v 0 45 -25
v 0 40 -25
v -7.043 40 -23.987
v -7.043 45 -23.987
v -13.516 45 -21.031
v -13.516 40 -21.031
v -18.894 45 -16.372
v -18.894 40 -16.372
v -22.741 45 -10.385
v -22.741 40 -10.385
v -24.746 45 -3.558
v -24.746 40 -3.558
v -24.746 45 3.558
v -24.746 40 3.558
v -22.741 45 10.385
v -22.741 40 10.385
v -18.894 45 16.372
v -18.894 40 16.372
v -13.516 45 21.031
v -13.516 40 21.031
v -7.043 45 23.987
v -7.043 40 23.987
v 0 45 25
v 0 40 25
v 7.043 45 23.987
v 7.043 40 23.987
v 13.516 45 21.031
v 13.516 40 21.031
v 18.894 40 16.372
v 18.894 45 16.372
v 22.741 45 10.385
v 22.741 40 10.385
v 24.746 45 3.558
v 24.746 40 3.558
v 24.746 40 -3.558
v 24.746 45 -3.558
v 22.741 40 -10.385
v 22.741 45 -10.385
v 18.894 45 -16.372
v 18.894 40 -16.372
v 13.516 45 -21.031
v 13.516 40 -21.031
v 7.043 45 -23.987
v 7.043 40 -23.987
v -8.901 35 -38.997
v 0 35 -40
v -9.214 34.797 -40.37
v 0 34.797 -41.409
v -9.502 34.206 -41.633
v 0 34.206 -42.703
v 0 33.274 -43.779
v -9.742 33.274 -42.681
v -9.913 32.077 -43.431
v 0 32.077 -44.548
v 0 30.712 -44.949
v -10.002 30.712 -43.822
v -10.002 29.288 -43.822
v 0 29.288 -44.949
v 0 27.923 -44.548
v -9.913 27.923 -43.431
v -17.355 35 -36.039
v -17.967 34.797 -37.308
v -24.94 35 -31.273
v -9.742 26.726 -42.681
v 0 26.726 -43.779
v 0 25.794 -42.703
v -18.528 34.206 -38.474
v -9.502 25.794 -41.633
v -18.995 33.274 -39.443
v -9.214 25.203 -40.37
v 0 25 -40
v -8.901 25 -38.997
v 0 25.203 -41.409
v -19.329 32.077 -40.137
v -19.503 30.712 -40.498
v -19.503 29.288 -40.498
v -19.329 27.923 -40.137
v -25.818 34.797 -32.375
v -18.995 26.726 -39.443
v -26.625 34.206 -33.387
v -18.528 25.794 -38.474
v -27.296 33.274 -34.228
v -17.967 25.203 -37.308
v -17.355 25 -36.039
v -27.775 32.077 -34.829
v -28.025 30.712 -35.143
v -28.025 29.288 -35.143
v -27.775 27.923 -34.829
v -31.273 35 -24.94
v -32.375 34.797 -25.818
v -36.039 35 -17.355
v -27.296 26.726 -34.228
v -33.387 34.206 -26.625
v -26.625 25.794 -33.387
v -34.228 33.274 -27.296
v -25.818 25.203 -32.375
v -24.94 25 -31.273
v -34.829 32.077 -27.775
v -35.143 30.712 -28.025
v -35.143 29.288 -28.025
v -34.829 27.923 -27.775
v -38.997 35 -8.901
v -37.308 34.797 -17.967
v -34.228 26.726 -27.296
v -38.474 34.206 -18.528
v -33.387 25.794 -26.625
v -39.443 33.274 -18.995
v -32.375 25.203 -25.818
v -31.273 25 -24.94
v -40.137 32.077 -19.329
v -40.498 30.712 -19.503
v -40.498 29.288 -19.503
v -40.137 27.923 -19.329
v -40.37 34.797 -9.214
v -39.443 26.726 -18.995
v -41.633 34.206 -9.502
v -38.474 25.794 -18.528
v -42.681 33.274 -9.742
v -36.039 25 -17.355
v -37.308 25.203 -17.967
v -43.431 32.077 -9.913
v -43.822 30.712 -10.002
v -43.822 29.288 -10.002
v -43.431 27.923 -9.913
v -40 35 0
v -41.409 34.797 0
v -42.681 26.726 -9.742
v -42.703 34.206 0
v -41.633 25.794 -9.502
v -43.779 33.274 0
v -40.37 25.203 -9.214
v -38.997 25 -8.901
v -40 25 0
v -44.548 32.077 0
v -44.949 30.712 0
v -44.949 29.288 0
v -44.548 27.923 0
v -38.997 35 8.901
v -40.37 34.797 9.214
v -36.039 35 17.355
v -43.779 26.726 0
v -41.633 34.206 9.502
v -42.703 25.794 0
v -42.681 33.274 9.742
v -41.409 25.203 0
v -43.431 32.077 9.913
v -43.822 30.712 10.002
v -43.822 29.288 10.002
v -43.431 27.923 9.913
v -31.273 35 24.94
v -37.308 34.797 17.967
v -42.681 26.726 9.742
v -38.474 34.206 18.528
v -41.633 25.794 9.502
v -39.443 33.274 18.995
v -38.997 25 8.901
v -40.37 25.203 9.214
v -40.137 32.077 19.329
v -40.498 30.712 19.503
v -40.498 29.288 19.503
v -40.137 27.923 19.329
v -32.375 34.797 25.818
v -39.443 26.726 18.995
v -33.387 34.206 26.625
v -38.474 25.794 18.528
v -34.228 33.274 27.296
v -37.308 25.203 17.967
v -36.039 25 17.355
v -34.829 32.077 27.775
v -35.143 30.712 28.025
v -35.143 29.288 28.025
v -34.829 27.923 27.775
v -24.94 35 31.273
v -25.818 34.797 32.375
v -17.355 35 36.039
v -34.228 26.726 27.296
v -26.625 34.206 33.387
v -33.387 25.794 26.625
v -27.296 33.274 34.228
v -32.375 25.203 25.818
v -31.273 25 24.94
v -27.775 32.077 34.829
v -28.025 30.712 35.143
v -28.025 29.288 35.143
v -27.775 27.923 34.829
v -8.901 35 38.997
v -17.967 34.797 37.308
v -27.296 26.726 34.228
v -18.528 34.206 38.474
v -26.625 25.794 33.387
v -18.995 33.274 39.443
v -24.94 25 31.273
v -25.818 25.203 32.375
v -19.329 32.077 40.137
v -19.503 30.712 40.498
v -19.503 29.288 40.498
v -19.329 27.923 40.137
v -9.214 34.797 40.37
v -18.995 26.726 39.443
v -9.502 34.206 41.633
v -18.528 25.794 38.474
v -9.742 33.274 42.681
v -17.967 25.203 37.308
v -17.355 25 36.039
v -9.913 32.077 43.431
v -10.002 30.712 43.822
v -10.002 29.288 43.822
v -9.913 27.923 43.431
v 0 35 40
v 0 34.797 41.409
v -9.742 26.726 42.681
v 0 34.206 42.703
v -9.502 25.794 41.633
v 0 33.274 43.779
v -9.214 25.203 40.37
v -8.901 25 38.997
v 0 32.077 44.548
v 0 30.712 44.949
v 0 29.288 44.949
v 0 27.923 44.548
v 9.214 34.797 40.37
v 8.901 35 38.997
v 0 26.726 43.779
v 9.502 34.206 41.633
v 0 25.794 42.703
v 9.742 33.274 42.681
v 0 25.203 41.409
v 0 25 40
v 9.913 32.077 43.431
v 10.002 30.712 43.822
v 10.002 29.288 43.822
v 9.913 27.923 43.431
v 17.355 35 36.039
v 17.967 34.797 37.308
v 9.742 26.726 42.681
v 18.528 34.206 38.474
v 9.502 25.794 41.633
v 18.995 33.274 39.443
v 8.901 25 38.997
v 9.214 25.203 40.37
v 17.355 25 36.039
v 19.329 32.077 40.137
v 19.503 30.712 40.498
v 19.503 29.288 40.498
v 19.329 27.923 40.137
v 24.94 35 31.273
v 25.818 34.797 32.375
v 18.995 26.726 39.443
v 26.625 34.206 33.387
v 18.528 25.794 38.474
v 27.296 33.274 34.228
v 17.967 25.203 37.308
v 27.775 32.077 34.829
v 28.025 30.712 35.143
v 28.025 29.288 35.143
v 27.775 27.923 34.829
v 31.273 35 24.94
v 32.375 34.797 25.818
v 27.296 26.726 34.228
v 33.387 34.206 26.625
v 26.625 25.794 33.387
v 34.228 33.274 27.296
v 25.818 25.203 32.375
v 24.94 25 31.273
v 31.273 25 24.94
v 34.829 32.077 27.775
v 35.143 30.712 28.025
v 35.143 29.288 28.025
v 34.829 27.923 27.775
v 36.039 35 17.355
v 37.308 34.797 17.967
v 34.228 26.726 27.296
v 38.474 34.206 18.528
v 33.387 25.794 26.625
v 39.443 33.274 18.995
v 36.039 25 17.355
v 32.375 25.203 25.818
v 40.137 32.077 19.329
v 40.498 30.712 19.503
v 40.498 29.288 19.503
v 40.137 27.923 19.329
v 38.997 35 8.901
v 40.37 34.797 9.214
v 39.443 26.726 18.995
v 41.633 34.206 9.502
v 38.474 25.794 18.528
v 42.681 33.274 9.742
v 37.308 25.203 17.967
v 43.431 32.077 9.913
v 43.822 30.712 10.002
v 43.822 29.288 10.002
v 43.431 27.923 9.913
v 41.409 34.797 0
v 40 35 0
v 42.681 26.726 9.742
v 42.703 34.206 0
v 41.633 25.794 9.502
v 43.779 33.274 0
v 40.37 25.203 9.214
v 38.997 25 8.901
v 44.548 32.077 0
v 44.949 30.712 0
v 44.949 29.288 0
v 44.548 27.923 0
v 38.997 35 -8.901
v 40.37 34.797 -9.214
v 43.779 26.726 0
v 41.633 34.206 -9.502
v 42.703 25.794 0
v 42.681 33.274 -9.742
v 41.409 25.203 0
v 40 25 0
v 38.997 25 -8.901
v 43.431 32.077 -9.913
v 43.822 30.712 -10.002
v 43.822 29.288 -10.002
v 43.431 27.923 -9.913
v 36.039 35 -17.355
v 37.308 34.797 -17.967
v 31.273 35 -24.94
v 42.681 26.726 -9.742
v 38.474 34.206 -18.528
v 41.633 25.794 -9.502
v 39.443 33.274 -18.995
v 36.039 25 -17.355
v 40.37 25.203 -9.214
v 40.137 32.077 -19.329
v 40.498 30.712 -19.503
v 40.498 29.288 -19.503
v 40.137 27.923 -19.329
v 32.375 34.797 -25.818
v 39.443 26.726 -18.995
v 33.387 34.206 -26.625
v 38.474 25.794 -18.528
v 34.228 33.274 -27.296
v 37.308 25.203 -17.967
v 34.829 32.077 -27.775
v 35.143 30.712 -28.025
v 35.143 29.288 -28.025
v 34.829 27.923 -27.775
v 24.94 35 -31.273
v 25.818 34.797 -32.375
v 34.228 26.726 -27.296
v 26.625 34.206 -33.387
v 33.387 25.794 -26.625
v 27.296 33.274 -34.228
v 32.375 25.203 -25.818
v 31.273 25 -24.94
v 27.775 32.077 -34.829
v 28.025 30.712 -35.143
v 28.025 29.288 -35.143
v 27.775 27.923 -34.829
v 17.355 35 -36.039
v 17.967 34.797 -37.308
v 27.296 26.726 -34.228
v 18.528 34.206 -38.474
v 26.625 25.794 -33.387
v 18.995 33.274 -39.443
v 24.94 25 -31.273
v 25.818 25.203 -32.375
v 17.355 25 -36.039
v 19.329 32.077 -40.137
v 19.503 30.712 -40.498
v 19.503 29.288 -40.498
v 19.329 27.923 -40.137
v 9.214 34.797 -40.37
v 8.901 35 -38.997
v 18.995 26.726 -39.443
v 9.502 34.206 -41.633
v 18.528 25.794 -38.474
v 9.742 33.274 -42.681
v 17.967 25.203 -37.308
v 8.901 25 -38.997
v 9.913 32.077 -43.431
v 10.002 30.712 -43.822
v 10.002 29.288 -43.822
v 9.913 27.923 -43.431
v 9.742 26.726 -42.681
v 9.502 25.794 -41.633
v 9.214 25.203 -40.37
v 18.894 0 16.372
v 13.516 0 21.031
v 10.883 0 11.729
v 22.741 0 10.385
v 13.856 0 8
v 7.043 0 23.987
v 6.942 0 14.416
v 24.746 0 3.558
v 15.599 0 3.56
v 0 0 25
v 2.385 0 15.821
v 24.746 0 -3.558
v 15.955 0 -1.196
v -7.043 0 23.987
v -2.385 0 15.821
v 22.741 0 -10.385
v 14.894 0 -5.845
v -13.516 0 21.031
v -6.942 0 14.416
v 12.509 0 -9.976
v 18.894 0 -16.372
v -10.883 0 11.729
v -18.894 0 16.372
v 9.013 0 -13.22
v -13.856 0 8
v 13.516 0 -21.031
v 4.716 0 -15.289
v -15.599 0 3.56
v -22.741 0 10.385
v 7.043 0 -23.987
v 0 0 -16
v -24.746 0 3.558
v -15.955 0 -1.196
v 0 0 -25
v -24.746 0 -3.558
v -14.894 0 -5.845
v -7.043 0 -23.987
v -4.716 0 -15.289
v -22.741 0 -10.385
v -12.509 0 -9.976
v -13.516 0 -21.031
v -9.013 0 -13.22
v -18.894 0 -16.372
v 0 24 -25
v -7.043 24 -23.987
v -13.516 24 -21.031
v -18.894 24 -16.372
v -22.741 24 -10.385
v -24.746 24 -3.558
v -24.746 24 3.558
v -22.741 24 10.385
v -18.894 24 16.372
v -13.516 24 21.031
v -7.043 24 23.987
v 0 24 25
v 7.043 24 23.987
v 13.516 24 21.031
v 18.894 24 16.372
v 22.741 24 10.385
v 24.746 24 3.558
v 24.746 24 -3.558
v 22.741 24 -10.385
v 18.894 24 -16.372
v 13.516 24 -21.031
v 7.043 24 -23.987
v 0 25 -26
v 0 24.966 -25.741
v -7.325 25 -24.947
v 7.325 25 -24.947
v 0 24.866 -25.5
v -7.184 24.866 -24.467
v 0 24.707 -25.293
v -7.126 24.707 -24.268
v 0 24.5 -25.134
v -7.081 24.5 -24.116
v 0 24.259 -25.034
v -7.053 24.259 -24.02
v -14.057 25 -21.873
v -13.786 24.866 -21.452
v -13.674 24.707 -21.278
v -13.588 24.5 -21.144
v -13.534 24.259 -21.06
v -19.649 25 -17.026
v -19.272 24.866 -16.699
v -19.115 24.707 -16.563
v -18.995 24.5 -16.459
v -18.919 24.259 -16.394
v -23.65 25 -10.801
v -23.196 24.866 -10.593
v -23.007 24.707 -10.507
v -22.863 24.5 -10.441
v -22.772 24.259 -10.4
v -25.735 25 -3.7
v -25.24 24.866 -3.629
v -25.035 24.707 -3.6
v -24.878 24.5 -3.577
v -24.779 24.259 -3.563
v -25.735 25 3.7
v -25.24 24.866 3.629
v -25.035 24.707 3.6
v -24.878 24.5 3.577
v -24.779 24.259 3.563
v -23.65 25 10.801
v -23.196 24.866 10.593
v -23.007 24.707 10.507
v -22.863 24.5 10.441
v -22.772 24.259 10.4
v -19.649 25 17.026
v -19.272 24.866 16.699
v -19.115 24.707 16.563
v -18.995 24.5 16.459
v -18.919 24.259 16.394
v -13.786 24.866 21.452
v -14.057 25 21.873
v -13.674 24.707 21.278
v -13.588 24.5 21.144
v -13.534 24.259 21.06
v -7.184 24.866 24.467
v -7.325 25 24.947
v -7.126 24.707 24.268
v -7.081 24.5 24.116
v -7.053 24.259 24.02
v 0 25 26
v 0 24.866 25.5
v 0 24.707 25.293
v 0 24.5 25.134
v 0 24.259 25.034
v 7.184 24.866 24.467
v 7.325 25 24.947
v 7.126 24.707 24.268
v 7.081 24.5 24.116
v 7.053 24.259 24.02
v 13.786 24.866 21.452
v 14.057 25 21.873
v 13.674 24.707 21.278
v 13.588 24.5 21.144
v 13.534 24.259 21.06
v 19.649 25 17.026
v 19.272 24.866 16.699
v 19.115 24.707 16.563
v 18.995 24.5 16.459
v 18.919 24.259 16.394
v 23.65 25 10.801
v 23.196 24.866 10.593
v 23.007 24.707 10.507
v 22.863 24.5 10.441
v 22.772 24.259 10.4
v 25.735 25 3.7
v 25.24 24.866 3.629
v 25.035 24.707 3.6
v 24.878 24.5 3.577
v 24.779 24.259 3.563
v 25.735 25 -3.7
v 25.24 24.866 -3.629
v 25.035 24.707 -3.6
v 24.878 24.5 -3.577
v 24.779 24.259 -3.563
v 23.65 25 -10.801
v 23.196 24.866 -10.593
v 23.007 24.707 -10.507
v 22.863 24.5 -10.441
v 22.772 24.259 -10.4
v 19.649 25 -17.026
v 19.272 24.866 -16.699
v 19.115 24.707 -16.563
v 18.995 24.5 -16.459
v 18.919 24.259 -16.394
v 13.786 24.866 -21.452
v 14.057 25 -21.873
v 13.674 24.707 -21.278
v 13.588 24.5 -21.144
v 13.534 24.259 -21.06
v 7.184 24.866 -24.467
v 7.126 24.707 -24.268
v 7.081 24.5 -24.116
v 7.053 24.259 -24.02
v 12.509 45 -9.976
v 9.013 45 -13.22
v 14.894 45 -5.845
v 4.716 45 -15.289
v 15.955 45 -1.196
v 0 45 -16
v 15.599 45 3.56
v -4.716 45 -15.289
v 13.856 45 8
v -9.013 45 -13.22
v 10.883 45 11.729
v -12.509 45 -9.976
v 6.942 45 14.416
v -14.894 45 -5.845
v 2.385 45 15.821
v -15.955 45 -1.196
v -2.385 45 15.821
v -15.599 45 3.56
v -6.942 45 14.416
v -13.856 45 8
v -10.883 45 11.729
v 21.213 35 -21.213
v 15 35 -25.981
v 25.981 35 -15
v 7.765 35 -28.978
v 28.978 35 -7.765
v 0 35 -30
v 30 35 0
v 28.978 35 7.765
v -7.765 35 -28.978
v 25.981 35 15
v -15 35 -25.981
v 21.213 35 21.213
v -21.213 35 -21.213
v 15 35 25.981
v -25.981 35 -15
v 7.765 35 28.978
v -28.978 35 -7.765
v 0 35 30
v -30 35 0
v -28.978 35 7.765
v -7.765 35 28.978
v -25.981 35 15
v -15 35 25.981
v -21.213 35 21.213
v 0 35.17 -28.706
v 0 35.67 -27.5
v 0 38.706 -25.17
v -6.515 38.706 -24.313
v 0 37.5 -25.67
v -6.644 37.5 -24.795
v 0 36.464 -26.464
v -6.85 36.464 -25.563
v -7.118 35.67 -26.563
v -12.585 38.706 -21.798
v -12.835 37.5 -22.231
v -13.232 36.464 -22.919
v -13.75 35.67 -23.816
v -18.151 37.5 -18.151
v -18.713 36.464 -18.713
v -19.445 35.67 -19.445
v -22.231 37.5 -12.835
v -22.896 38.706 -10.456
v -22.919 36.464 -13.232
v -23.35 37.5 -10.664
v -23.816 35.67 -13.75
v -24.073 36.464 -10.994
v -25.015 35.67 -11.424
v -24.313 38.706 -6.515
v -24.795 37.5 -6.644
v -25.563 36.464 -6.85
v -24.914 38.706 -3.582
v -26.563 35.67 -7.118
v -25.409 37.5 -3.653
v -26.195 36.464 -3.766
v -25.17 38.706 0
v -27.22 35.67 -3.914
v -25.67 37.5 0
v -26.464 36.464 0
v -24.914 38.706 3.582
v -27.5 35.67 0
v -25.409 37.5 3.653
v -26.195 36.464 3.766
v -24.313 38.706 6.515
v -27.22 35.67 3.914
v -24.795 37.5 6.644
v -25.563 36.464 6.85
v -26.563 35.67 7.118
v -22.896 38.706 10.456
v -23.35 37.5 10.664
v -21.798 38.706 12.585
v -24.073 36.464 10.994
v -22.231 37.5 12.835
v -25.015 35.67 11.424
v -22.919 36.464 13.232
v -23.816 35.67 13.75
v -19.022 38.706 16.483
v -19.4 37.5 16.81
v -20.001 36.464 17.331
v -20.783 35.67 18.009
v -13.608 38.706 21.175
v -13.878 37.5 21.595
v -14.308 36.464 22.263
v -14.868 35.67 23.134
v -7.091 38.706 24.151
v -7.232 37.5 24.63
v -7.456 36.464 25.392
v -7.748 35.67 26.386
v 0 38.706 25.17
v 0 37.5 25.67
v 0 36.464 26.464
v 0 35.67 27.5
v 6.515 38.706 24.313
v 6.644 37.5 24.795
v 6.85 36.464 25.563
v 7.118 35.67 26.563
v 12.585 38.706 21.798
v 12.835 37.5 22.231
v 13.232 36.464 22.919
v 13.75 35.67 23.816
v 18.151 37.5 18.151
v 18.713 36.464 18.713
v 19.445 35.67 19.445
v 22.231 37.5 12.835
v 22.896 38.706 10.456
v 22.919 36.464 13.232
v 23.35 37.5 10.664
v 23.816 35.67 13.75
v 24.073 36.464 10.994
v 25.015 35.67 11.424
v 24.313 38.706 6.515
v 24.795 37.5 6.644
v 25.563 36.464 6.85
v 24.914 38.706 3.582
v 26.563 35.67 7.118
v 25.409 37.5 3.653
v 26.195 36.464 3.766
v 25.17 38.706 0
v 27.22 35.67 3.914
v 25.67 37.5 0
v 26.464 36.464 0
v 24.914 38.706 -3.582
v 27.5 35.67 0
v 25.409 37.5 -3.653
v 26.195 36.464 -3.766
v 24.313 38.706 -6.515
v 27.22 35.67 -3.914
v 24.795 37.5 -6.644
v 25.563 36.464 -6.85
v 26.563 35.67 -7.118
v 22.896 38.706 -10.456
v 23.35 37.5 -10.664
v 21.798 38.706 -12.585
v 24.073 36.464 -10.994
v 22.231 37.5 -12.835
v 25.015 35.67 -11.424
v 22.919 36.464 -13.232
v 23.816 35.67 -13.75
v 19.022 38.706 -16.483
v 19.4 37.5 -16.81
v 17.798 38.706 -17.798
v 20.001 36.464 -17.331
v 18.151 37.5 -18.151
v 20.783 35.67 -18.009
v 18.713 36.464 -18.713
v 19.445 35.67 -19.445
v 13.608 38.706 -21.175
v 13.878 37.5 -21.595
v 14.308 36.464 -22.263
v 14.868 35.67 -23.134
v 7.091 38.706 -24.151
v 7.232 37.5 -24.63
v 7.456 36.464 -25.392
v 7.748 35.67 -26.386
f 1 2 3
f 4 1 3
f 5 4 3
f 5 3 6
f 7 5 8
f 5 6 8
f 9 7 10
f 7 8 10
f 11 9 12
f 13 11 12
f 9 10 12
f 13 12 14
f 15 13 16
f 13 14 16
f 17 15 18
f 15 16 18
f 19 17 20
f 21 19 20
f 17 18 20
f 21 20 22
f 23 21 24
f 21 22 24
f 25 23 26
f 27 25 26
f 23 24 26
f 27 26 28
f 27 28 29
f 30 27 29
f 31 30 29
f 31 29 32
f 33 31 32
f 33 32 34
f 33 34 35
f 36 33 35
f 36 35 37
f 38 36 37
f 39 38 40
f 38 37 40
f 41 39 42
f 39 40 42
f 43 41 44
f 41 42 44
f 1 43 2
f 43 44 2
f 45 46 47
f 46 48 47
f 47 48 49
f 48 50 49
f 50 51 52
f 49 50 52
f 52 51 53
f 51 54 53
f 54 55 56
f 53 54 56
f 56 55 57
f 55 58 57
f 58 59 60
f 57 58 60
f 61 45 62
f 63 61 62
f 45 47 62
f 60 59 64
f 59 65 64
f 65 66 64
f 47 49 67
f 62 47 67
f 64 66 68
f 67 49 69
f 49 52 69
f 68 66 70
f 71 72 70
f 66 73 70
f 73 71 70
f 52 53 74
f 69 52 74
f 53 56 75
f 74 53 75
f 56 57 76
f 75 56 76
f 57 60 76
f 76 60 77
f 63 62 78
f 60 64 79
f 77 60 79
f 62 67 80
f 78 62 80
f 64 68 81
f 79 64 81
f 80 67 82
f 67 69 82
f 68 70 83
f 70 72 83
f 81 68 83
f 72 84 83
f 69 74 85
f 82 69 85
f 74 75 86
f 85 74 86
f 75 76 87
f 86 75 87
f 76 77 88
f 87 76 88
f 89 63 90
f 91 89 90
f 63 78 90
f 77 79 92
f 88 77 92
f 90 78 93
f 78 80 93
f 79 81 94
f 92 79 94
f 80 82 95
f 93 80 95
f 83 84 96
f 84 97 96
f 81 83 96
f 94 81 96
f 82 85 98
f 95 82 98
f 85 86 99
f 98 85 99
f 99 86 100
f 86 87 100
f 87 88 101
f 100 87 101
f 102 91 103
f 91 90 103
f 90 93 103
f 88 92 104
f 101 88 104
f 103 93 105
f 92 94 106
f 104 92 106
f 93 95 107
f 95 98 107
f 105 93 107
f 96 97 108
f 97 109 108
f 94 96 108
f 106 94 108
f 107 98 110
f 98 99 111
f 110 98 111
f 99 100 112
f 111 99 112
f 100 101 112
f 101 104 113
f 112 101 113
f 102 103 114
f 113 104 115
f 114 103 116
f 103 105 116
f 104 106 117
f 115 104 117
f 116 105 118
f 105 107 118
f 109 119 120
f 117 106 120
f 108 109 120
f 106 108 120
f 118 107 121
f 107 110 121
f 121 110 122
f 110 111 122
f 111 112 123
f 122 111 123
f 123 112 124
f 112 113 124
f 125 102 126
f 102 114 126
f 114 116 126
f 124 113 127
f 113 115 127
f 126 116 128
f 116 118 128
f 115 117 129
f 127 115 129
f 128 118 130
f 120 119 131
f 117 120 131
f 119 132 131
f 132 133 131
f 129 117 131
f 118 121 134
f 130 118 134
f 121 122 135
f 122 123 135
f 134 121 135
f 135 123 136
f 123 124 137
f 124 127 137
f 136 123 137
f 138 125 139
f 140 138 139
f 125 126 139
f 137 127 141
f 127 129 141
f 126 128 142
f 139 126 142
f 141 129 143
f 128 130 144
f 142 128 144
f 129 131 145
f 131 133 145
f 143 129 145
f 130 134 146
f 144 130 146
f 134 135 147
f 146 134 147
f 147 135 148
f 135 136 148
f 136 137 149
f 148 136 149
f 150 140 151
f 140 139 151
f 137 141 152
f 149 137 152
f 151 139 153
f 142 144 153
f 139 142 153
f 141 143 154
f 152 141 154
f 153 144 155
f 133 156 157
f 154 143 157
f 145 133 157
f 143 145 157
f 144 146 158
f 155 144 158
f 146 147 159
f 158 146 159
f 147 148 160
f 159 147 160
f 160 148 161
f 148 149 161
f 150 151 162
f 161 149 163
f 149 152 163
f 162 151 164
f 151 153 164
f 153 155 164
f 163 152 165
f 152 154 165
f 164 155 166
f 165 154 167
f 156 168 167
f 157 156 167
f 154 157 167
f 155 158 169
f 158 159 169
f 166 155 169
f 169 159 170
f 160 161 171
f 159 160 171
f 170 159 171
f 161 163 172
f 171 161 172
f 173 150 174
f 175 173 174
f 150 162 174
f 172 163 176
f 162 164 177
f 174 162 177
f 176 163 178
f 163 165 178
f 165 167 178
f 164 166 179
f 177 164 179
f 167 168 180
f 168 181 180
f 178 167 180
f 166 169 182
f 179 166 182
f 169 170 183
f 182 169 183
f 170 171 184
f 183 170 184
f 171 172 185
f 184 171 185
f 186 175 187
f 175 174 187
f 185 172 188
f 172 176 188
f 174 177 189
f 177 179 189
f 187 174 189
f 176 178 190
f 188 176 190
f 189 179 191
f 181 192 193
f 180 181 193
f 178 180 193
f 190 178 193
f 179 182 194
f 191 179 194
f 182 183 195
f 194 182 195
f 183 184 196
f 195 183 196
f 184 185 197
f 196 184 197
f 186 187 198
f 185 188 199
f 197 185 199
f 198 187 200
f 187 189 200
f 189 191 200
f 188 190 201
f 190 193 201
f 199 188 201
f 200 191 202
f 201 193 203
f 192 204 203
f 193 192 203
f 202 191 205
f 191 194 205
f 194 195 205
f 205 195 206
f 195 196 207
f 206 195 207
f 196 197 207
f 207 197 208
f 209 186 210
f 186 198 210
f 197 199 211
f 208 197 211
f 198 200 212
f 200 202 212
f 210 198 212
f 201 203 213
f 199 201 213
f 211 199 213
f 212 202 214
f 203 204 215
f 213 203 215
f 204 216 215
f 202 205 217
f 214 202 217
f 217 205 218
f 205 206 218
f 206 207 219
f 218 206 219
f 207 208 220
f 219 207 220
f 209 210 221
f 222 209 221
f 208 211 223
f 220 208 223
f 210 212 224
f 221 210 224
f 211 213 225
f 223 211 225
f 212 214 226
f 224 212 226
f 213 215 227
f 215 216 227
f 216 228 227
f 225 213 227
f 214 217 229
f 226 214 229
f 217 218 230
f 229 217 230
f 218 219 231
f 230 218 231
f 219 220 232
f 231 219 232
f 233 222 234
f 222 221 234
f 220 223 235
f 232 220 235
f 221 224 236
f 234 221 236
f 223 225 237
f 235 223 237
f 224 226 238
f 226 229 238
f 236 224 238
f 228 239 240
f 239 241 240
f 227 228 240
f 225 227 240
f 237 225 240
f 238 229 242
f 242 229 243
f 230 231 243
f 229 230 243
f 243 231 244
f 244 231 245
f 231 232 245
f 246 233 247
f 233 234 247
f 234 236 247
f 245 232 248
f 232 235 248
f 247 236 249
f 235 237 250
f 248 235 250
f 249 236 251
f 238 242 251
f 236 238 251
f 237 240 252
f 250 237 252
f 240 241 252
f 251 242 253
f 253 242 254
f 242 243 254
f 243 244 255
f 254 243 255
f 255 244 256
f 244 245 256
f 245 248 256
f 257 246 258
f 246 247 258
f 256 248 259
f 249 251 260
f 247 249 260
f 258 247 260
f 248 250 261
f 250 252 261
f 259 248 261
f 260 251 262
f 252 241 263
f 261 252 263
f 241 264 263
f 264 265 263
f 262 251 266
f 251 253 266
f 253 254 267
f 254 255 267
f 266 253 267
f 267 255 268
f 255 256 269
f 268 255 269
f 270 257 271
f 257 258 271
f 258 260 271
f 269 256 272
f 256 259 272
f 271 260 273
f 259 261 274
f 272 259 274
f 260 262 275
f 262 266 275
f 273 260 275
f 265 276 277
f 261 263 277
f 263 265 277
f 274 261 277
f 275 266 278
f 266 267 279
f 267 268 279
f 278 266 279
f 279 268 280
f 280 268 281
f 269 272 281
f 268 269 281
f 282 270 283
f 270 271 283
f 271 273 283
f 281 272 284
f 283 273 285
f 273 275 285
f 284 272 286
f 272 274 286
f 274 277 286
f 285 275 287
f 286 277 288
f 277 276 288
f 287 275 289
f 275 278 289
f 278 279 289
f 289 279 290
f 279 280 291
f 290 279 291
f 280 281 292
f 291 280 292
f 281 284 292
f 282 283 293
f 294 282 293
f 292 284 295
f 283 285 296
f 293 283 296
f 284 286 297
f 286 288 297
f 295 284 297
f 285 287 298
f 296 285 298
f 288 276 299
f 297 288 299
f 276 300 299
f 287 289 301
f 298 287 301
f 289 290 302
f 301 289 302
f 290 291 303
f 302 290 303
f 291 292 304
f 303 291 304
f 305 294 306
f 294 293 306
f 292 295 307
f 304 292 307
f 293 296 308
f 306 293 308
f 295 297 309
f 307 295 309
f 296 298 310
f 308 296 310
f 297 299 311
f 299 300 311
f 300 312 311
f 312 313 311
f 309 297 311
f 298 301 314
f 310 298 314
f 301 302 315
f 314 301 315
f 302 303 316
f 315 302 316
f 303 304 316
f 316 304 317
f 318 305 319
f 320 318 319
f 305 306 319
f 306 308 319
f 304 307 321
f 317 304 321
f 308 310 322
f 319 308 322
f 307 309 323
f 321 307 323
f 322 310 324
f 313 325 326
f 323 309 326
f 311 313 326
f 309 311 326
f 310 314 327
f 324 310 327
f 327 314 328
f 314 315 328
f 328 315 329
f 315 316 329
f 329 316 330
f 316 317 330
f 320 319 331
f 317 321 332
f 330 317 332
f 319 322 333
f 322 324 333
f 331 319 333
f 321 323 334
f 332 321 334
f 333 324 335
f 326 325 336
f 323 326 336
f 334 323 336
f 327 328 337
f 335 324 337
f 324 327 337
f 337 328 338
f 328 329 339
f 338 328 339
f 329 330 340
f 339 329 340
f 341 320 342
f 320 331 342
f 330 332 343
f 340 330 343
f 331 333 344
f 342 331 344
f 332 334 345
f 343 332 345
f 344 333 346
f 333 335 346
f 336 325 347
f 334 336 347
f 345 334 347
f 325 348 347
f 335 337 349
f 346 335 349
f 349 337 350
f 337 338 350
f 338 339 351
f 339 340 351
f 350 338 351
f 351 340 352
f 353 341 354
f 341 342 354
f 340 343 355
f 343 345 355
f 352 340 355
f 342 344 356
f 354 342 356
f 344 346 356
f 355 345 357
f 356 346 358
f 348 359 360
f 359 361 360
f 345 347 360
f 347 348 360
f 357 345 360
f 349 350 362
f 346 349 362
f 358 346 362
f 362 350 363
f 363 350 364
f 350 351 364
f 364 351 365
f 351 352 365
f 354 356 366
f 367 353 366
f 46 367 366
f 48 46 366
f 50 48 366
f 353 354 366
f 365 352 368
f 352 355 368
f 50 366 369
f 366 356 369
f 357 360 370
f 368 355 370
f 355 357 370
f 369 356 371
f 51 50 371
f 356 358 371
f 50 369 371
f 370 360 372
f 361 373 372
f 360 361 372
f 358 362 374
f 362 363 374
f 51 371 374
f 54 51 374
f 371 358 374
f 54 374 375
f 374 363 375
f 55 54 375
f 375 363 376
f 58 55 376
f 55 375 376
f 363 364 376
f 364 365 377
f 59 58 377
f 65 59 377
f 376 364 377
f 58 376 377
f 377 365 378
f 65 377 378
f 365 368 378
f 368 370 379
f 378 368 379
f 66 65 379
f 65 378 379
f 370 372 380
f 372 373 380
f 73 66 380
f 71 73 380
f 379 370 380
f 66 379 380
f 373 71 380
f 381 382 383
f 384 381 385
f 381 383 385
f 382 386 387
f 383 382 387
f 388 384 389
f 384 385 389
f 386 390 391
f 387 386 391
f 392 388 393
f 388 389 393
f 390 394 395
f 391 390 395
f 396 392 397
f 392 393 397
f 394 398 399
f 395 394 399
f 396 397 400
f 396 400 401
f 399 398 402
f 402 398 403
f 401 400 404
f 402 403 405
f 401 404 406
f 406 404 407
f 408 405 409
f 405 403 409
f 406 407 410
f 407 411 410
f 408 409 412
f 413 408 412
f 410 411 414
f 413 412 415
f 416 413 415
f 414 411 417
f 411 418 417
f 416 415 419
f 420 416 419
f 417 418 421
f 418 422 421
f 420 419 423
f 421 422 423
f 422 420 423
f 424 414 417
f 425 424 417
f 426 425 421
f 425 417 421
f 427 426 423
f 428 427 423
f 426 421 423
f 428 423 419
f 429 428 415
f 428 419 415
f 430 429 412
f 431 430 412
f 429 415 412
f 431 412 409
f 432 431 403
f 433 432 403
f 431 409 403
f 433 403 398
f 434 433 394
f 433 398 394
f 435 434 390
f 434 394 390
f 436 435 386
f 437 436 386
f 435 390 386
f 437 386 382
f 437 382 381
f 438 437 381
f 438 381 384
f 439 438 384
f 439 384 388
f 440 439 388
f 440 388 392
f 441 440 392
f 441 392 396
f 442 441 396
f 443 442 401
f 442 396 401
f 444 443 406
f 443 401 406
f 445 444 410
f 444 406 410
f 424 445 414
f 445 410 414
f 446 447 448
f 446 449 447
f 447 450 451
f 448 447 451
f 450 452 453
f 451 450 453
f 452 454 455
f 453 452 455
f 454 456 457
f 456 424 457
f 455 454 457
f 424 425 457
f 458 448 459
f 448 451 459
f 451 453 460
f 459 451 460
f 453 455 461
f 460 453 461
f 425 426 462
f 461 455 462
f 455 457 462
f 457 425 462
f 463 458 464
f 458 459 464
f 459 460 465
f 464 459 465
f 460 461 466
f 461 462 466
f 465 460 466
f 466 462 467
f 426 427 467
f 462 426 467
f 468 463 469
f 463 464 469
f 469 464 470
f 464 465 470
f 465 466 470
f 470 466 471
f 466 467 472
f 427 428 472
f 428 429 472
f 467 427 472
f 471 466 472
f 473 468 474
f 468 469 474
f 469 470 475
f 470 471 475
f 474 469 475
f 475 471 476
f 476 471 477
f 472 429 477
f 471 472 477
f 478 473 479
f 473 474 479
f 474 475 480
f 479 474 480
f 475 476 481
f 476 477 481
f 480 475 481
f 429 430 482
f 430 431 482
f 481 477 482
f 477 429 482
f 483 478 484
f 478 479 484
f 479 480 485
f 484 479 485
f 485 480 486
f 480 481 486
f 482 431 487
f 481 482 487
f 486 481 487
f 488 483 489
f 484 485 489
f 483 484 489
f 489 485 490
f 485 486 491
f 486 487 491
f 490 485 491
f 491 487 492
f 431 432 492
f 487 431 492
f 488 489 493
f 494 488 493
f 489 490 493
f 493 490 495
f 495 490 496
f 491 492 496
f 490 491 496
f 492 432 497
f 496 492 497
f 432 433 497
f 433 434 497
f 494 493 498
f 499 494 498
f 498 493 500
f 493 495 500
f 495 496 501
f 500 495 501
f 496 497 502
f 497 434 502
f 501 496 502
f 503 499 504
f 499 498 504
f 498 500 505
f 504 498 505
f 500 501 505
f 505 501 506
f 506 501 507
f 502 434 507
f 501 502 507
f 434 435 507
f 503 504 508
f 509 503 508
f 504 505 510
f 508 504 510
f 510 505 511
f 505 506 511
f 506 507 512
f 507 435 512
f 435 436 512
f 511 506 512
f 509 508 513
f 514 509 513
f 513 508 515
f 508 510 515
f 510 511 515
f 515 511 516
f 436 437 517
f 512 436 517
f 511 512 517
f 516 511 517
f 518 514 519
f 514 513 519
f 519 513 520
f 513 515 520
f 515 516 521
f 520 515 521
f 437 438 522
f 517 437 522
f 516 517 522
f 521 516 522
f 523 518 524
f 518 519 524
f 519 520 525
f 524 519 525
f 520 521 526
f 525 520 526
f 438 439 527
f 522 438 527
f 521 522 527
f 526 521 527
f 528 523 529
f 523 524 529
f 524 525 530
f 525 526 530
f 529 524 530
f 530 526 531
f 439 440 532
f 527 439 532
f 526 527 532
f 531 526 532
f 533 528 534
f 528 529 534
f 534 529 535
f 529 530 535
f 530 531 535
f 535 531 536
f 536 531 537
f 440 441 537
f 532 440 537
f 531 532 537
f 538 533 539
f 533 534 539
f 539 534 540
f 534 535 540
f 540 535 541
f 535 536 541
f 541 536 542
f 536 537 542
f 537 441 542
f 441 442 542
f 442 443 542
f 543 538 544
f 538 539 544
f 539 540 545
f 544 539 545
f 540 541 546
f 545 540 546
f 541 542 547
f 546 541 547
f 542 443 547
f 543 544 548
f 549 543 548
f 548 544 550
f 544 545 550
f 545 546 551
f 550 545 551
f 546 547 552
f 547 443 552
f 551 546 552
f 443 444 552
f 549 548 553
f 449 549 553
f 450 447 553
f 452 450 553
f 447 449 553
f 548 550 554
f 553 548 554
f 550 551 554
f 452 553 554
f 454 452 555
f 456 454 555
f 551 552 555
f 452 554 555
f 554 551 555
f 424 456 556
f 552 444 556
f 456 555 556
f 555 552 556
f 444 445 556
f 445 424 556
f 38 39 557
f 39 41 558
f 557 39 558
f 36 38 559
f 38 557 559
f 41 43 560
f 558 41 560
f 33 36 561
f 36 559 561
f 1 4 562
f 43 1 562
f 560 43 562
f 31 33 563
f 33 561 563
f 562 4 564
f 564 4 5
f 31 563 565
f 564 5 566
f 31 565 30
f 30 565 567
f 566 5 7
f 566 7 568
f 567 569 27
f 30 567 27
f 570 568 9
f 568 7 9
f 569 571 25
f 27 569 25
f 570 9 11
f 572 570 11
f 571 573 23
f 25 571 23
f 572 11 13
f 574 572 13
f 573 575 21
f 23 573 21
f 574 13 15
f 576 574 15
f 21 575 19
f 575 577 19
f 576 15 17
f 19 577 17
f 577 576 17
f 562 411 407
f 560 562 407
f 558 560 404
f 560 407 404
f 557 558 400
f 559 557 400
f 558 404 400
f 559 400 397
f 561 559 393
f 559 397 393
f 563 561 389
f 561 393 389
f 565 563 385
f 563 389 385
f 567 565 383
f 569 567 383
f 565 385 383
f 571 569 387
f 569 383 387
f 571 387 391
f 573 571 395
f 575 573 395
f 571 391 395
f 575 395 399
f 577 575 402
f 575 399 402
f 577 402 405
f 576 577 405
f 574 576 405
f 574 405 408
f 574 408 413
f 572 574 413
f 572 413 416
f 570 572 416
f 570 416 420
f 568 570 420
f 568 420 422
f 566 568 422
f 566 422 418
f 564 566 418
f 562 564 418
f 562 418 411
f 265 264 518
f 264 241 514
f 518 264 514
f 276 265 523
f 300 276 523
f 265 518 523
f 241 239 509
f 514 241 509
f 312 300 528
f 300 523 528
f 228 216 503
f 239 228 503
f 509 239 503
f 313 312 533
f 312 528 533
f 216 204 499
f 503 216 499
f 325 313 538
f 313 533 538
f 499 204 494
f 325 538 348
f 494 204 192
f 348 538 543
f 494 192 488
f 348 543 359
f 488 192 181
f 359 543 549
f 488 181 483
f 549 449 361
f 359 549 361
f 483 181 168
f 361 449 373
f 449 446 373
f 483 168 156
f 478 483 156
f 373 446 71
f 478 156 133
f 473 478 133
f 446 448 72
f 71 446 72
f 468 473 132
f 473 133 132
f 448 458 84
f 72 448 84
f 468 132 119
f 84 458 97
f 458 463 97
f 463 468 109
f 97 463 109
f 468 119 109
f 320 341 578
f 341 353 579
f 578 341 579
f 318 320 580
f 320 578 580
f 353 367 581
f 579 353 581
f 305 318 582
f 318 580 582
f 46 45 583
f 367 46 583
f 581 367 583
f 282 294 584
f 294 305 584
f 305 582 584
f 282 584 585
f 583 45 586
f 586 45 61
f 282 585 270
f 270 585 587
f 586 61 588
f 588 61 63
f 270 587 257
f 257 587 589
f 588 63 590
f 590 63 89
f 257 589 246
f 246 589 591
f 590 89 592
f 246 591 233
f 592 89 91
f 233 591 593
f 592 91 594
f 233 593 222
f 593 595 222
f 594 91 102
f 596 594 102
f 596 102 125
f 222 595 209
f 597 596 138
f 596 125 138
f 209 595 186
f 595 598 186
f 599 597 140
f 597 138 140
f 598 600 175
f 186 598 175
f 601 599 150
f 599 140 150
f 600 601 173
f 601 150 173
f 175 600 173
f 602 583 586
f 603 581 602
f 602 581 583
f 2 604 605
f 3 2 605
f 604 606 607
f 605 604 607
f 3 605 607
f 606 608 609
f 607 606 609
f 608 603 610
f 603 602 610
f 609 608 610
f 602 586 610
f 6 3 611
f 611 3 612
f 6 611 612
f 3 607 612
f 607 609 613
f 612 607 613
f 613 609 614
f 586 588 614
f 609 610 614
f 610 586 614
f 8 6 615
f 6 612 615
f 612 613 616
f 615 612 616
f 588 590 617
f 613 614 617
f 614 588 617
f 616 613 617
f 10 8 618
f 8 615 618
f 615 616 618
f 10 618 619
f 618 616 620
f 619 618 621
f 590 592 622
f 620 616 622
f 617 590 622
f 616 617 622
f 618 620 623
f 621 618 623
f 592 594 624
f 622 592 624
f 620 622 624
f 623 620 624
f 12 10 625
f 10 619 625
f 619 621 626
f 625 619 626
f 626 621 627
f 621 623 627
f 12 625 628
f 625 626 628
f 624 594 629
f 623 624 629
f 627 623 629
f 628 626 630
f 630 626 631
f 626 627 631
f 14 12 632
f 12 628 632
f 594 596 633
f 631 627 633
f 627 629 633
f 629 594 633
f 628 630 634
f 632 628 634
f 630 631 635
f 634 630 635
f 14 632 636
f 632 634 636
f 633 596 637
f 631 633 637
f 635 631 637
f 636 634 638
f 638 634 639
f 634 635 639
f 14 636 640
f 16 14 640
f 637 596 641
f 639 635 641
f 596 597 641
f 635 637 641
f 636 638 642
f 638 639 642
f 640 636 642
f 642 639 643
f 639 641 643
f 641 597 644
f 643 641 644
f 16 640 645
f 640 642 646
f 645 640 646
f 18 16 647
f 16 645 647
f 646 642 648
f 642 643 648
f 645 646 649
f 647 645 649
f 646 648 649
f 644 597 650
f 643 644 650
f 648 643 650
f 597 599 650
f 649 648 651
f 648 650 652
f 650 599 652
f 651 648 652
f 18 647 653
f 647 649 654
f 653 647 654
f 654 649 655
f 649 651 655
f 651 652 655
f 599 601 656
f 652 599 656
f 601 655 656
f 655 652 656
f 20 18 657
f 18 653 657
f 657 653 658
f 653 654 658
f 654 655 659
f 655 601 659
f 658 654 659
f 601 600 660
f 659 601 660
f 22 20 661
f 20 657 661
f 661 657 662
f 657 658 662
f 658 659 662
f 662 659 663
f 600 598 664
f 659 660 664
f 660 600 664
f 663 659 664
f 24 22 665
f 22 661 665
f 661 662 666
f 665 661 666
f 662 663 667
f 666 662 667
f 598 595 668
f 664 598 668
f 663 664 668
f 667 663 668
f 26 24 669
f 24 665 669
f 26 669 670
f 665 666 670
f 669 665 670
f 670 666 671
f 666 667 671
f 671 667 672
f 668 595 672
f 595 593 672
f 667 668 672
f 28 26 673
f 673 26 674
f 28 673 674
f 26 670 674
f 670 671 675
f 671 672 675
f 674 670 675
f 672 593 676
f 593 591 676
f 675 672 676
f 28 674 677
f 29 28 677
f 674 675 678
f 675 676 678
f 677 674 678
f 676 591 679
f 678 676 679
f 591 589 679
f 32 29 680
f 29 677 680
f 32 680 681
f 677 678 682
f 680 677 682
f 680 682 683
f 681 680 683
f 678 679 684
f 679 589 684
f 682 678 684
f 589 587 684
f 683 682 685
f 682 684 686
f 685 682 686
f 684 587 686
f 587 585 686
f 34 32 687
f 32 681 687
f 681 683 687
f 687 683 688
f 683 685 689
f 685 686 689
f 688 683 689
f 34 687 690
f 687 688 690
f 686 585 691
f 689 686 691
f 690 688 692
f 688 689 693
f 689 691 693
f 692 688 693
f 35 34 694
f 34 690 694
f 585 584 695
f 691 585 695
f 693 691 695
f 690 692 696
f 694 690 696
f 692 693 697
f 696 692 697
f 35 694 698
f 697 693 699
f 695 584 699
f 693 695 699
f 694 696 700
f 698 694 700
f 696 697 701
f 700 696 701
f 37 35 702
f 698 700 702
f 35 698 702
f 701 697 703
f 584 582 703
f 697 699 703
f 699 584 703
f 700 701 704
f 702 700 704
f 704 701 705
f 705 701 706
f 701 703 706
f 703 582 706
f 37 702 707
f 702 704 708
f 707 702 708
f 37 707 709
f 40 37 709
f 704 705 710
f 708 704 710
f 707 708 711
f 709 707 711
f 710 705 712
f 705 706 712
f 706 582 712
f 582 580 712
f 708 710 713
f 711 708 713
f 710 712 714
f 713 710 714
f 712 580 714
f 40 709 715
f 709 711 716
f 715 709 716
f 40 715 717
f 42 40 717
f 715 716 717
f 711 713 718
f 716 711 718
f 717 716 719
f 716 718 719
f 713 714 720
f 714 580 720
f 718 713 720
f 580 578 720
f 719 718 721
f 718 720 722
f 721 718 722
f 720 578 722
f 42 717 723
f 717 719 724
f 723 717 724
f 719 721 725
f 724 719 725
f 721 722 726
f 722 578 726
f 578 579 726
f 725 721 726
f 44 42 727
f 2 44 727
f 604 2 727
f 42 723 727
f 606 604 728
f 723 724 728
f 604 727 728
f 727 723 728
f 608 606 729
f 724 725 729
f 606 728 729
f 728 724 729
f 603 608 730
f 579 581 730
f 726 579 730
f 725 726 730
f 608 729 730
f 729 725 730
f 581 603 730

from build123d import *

# Parameters (mm, degrees)
M36_TAPPED_HOLE1_D = 32
FILLET1_R          = 5
FILLET2_R          = 1


with BuildPart() as part:
    # Sketch1 → Revolve1 (revolve)
    with BuildSketch(Plane.XY, mode=Mode.PRIVATE) as revolve1_sk:
        with BuildLine():
            Line((0, 0), (0, 45))
            Line((0, 45), (25, 45))
            Line((25, 45), (25, 35))
            Line((25, 35), (40, 35))
            ThreePointArc((40, 35), (45, 30), (40, 25))
            Line((40, 25), (25, 25))
            Line((25, 25), (25, 0))
            Line((25, 0), (0, 0))
        make_face()
    revolve(revolve1_sk.sketch.rotate(Axis((0, 0, 0), (0, 1, 0)), 90), axis=Axis((0, 0, 0), (0, 1, 0)))

    # M36 Tapped Hole1 (through all)
    with Locations(Plane.ZX.offset(45)):
        with Locations((0, 0)):
            Hole(M36_TAPPED_HOLE1_D / 2)

    # Fillet1
    fillet1_edges = [part.edges().sort_by_distance(p)[0] for p in [
        (0, 35, 25),
    ]]
    fillet(fillet1_edges, radius=FILLET1_R)

    # Fillet2
    fillet2_edges = [part.edges().sort_by_distance(p)[0] for p in [
        (0, 25, 25),
    ]]
    fillet(fillet2_edges, radius=FILLET2_R)


solid = part.part
